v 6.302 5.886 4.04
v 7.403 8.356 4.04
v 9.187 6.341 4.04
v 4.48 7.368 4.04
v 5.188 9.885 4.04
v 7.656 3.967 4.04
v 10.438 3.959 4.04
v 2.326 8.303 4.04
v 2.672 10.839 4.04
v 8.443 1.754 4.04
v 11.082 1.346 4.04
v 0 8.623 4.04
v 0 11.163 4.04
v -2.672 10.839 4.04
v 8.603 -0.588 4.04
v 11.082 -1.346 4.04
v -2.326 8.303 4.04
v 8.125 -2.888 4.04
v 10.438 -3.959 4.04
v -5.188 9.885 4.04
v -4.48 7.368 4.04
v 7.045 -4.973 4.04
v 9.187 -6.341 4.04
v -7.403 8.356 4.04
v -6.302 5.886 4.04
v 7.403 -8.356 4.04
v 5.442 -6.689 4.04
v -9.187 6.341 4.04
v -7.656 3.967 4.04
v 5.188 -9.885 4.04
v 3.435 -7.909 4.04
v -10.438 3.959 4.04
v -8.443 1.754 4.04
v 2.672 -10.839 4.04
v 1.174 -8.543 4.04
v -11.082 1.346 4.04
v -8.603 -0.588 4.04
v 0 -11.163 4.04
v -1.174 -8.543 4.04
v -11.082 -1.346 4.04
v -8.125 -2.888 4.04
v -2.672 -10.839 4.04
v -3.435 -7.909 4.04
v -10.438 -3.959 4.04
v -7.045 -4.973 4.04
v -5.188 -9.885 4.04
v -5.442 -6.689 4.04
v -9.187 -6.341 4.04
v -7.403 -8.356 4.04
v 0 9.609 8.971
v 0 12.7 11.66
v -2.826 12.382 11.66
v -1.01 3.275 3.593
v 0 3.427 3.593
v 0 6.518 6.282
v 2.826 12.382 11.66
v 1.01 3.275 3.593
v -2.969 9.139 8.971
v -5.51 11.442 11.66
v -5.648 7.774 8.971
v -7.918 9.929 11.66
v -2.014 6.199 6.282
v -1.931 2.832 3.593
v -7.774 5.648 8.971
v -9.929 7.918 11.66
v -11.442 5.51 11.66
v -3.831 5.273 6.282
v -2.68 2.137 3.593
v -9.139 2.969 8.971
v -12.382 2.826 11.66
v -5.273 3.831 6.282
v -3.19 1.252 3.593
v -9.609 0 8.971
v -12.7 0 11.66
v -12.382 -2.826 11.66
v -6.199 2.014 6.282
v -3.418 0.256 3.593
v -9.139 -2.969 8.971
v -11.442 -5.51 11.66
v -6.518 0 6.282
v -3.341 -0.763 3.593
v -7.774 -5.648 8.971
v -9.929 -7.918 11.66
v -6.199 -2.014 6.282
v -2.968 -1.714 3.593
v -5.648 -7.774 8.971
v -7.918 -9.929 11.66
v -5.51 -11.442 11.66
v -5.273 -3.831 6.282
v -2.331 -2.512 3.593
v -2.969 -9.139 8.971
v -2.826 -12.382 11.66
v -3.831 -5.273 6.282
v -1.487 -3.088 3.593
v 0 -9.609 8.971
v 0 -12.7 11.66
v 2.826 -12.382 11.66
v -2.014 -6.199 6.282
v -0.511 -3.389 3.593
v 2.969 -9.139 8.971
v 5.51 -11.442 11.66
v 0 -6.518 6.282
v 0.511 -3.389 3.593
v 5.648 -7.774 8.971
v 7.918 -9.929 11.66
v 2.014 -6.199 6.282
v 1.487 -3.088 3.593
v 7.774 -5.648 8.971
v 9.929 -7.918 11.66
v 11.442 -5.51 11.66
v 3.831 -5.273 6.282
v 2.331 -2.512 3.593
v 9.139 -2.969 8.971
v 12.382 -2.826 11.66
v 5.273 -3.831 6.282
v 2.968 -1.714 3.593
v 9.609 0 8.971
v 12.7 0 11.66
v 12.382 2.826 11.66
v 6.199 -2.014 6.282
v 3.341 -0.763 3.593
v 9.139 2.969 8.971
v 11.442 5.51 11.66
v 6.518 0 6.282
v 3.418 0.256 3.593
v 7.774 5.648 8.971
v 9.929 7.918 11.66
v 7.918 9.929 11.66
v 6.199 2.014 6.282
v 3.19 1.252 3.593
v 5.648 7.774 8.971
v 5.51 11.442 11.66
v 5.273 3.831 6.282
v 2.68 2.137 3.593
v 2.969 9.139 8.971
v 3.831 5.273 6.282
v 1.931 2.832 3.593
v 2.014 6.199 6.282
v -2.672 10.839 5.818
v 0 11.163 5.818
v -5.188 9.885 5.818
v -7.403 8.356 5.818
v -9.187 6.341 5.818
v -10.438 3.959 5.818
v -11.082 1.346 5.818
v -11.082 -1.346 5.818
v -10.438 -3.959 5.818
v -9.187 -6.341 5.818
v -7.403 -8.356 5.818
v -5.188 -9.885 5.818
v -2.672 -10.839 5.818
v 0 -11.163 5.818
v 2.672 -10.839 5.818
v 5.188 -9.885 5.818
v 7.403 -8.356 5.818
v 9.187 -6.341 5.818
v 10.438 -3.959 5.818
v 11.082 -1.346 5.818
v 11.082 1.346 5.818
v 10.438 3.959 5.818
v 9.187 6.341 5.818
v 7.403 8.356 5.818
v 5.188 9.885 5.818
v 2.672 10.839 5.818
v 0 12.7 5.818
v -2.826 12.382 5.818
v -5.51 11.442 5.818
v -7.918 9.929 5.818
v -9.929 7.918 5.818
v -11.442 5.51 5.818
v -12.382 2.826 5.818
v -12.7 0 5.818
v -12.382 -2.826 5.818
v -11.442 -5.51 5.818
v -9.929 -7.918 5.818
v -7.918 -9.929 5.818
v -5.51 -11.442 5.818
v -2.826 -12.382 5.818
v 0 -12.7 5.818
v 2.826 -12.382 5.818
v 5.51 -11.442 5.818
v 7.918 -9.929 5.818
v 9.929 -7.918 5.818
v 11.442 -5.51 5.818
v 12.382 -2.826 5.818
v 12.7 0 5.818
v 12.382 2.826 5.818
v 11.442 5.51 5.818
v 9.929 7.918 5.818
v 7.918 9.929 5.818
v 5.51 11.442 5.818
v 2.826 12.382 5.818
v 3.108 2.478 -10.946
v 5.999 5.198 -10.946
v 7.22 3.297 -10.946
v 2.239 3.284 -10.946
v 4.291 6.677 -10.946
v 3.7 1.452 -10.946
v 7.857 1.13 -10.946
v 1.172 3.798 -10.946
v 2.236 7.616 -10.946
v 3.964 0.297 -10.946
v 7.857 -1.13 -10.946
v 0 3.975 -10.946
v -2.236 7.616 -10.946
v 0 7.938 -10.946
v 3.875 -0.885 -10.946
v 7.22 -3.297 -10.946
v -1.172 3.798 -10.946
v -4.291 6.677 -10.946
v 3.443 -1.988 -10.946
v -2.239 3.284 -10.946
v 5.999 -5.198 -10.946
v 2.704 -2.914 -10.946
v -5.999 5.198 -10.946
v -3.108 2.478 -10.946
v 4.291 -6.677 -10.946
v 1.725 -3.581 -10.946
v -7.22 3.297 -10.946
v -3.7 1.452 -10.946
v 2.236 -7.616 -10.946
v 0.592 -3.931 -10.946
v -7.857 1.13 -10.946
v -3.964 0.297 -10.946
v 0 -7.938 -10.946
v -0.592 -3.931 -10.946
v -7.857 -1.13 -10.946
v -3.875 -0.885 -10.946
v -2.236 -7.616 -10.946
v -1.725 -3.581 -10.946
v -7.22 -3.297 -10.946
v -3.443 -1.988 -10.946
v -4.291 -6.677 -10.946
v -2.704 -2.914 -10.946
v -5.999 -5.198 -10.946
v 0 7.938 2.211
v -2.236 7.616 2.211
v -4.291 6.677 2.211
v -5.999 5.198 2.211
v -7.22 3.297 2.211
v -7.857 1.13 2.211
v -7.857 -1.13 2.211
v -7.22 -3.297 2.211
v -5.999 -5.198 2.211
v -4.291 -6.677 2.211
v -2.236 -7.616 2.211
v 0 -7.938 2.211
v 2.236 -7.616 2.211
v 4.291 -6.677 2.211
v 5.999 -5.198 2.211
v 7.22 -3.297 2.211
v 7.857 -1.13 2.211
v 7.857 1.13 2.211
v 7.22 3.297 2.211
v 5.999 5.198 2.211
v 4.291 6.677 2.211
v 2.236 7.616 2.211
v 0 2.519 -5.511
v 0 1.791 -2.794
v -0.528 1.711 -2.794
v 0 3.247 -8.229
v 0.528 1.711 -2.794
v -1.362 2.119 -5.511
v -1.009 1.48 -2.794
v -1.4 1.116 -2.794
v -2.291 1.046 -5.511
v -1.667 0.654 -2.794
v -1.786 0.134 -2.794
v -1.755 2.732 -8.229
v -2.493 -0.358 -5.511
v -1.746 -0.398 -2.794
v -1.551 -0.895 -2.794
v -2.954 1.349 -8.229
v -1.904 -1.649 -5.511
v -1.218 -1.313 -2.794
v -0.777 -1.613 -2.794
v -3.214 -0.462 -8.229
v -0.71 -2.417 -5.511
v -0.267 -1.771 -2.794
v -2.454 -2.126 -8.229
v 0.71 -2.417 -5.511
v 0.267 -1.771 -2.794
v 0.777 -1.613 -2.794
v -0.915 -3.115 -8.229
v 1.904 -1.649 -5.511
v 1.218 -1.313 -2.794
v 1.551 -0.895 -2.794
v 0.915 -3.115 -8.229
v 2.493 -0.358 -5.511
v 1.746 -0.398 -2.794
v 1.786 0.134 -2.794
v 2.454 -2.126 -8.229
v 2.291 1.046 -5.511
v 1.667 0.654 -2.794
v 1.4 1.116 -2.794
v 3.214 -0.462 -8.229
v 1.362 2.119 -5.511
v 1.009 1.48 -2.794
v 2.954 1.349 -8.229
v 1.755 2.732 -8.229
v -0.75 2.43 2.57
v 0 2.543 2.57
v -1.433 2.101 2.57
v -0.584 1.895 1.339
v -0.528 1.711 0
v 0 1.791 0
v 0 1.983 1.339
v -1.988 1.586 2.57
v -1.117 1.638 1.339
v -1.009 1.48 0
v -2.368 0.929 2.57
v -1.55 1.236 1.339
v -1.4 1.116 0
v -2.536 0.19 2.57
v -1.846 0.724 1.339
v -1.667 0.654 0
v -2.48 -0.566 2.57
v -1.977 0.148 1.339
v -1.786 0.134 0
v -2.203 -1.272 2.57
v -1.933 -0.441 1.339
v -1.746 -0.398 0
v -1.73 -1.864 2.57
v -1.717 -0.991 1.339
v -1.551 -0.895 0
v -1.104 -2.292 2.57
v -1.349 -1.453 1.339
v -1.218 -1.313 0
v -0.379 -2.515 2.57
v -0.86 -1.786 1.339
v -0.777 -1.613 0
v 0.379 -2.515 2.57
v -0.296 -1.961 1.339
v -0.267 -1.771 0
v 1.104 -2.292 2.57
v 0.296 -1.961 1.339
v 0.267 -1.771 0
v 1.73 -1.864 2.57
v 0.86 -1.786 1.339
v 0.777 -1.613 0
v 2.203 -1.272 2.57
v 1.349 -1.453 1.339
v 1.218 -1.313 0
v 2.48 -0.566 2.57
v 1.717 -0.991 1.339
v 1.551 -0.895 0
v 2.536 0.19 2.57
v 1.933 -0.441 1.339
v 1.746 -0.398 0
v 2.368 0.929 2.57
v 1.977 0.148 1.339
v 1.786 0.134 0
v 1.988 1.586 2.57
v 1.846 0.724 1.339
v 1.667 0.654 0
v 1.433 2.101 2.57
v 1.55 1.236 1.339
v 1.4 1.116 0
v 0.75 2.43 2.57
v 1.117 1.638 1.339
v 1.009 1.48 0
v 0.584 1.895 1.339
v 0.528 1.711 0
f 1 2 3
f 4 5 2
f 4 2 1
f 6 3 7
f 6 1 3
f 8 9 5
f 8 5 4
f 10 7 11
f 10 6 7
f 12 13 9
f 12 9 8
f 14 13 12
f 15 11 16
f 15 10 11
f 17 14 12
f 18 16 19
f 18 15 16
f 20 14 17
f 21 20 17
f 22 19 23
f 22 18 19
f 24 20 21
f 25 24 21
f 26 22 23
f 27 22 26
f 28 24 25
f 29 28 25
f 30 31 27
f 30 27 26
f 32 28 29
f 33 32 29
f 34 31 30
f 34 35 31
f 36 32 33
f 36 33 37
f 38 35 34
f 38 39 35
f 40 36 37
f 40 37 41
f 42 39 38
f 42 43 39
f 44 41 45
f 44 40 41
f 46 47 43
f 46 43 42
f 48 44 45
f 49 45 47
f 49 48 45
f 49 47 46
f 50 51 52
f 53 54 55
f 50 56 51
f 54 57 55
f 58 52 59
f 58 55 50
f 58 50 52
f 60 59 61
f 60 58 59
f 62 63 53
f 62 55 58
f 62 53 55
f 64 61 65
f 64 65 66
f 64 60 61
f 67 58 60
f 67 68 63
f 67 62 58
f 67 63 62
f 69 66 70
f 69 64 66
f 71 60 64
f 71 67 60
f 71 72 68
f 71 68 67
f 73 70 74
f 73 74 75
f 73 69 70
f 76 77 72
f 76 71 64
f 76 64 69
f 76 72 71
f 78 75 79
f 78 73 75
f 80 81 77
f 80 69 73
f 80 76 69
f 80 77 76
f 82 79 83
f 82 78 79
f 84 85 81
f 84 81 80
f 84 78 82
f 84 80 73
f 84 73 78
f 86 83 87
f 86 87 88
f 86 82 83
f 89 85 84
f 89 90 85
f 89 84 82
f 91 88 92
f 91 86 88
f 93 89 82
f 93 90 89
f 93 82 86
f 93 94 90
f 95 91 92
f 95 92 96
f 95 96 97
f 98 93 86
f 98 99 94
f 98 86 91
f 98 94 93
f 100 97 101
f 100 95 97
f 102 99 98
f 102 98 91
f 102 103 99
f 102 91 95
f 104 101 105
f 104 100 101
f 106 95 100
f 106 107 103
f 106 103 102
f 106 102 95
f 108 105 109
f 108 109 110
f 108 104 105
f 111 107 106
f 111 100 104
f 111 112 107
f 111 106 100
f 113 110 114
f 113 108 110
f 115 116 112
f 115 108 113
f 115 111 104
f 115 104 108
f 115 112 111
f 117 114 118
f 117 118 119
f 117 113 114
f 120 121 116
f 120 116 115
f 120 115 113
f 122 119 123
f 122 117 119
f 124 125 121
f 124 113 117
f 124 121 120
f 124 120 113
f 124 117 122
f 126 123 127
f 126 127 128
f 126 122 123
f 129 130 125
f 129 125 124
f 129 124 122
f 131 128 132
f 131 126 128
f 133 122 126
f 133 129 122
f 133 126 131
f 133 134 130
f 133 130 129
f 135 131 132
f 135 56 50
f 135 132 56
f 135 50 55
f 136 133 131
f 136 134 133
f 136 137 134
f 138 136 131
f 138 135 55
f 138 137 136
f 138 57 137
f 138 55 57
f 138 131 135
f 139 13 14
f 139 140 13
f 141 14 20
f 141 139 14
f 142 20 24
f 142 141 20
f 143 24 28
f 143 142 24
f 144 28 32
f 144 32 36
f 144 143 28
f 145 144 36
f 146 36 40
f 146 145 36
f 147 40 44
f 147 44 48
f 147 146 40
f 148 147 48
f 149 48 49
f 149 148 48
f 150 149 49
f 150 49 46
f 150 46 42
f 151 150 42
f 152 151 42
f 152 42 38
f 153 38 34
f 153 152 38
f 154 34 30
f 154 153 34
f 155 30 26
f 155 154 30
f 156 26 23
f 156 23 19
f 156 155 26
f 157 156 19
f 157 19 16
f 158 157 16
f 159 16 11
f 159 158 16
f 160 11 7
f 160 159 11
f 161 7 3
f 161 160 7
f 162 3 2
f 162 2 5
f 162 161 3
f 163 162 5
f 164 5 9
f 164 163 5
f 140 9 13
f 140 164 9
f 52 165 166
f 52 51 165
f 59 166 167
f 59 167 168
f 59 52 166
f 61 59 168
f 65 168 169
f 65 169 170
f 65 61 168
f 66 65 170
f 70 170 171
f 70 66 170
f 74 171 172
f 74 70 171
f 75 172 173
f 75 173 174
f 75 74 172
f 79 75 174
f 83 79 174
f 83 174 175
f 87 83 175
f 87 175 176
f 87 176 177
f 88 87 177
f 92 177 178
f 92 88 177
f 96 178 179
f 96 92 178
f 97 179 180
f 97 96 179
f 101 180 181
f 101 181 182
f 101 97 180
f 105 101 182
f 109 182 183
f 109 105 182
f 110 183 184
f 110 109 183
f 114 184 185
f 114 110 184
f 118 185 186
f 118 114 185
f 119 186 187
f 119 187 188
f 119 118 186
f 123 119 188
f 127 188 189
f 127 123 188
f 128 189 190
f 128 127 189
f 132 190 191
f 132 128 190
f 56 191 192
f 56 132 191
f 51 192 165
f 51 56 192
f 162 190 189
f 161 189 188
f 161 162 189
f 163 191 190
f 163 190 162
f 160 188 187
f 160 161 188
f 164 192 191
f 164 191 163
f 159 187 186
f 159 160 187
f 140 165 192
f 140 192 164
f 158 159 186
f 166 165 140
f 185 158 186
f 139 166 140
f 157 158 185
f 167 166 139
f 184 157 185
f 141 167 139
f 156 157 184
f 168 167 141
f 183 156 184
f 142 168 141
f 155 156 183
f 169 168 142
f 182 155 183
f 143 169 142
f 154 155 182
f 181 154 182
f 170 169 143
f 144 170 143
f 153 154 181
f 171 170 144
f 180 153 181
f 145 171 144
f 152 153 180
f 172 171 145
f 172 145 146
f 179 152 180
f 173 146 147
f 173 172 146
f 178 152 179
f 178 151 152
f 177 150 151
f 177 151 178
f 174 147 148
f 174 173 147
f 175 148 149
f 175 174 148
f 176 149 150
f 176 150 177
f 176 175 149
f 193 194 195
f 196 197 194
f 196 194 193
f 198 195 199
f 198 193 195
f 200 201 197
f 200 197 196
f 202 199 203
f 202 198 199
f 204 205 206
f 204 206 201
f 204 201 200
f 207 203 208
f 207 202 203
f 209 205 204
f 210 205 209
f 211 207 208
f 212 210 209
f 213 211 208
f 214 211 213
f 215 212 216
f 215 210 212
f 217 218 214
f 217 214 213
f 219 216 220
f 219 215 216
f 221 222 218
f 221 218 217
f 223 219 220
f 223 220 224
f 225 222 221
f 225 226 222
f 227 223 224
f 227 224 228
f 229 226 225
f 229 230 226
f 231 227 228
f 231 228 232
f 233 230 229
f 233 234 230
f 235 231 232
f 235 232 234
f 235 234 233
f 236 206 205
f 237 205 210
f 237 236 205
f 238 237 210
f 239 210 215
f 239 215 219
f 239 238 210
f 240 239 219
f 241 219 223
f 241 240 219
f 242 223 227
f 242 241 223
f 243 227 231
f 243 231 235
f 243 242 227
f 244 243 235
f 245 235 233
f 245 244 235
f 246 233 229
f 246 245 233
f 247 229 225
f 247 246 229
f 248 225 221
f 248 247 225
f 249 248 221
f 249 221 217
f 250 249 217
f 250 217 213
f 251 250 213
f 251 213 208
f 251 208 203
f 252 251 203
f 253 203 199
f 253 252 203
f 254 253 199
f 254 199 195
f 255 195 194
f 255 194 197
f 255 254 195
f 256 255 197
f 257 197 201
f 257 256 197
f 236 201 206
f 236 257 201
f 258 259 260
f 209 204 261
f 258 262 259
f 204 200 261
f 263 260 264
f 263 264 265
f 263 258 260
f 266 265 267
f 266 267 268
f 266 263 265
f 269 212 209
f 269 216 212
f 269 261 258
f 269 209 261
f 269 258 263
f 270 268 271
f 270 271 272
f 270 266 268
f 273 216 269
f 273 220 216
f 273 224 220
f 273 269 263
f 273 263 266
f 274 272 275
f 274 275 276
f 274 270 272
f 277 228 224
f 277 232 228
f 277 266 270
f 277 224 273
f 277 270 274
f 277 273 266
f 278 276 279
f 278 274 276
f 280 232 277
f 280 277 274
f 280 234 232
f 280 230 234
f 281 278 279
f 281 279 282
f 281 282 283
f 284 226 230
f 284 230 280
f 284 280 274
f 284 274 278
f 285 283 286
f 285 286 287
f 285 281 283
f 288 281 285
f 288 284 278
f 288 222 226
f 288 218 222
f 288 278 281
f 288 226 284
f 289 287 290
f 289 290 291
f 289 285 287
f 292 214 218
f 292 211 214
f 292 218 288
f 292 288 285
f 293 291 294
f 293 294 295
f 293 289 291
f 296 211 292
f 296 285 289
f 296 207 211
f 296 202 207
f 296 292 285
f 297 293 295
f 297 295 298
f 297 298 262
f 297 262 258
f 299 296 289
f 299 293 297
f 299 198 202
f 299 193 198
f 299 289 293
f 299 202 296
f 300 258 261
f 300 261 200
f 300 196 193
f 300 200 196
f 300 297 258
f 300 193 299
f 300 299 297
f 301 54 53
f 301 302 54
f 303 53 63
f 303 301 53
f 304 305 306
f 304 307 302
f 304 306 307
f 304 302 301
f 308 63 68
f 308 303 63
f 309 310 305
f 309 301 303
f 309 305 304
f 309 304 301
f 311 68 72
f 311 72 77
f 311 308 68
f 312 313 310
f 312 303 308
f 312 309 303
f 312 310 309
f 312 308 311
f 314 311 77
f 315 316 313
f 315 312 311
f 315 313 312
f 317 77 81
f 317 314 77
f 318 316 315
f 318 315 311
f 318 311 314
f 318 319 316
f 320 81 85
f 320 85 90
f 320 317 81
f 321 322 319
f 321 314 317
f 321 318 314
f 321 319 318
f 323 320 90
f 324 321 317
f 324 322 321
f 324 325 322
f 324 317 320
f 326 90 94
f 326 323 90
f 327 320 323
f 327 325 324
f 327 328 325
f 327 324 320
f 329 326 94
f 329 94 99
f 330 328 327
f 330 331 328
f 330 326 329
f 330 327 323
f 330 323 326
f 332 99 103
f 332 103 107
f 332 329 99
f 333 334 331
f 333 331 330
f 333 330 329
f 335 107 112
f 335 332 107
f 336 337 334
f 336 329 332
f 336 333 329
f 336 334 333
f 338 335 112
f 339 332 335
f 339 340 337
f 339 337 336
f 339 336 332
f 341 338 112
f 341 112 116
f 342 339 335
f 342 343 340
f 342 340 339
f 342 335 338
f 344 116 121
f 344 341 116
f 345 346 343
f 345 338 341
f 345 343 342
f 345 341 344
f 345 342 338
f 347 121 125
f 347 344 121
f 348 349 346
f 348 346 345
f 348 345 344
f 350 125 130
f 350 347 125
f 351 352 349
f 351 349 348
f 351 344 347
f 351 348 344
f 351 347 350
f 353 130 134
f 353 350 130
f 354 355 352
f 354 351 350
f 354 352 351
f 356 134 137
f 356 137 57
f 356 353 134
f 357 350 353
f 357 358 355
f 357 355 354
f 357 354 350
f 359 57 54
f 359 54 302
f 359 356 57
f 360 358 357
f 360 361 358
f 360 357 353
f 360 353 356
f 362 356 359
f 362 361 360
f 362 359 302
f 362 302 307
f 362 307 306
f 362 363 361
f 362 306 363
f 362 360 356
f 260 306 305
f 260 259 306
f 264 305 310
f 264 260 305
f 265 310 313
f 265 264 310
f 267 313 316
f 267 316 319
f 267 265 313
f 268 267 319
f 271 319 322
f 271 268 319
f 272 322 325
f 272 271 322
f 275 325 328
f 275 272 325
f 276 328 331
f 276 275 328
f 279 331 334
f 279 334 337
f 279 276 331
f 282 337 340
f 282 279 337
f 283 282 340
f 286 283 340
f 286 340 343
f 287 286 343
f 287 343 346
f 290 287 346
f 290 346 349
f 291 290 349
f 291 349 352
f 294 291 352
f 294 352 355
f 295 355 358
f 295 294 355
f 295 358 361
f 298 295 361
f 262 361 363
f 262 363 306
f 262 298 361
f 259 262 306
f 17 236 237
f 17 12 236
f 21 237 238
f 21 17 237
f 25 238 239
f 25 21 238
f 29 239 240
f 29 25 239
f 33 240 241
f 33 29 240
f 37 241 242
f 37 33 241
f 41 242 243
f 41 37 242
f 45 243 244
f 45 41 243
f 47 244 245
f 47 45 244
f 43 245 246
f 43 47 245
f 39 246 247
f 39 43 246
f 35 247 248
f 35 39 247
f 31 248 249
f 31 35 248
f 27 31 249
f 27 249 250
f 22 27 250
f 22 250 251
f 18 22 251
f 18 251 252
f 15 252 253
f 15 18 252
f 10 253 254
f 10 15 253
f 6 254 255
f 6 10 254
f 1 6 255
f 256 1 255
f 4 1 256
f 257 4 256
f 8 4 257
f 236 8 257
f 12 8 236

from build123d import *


with BuildPart() as part:
    # Sketch2 → Revolve1 (revolve)
    with BuildSketch(Plane(origin=(0, 0, 0), x_dir=(0, 0, -1), z_dir=(1, 0, 0))):
        with BuildLine():
            Line((10.946291784, 7.9375), (-2.210908216, 7.9375))
            Line((-2.210908216, 7.9375), (-4.039708216, 8.62311403))
            Line((-4.039708216, 8.62311403), (-4.039708216, 11.1633))
            Line((-4.039708216, 11.1633), (-5.817708216, 11.1633))
            Line((-5.817708216, 11.1633), (-5.817708216, 12.7))
            Line((-5.817708216, 12.7), (-11.659708216, 12.7))
            Line((-11.659708216, 12.7), (-3.593152451, 3.42739423))
            ThreePointArc((-3.593152451, 3.42739423), (-1.974177838, 2.219145534), (0, 1.7907))
            Line((0, 1.7907), (2.794, 1.7907))
            Line((2.794, 1.7907), (10.946291784, 3.9751))
            Line((10.946291784, 3.9751), (10.946291784, 7.9375))
        make_face()
    revolve(axis=Axis((0, 0, 0), (0, 0, 1)))


solid = part.part
